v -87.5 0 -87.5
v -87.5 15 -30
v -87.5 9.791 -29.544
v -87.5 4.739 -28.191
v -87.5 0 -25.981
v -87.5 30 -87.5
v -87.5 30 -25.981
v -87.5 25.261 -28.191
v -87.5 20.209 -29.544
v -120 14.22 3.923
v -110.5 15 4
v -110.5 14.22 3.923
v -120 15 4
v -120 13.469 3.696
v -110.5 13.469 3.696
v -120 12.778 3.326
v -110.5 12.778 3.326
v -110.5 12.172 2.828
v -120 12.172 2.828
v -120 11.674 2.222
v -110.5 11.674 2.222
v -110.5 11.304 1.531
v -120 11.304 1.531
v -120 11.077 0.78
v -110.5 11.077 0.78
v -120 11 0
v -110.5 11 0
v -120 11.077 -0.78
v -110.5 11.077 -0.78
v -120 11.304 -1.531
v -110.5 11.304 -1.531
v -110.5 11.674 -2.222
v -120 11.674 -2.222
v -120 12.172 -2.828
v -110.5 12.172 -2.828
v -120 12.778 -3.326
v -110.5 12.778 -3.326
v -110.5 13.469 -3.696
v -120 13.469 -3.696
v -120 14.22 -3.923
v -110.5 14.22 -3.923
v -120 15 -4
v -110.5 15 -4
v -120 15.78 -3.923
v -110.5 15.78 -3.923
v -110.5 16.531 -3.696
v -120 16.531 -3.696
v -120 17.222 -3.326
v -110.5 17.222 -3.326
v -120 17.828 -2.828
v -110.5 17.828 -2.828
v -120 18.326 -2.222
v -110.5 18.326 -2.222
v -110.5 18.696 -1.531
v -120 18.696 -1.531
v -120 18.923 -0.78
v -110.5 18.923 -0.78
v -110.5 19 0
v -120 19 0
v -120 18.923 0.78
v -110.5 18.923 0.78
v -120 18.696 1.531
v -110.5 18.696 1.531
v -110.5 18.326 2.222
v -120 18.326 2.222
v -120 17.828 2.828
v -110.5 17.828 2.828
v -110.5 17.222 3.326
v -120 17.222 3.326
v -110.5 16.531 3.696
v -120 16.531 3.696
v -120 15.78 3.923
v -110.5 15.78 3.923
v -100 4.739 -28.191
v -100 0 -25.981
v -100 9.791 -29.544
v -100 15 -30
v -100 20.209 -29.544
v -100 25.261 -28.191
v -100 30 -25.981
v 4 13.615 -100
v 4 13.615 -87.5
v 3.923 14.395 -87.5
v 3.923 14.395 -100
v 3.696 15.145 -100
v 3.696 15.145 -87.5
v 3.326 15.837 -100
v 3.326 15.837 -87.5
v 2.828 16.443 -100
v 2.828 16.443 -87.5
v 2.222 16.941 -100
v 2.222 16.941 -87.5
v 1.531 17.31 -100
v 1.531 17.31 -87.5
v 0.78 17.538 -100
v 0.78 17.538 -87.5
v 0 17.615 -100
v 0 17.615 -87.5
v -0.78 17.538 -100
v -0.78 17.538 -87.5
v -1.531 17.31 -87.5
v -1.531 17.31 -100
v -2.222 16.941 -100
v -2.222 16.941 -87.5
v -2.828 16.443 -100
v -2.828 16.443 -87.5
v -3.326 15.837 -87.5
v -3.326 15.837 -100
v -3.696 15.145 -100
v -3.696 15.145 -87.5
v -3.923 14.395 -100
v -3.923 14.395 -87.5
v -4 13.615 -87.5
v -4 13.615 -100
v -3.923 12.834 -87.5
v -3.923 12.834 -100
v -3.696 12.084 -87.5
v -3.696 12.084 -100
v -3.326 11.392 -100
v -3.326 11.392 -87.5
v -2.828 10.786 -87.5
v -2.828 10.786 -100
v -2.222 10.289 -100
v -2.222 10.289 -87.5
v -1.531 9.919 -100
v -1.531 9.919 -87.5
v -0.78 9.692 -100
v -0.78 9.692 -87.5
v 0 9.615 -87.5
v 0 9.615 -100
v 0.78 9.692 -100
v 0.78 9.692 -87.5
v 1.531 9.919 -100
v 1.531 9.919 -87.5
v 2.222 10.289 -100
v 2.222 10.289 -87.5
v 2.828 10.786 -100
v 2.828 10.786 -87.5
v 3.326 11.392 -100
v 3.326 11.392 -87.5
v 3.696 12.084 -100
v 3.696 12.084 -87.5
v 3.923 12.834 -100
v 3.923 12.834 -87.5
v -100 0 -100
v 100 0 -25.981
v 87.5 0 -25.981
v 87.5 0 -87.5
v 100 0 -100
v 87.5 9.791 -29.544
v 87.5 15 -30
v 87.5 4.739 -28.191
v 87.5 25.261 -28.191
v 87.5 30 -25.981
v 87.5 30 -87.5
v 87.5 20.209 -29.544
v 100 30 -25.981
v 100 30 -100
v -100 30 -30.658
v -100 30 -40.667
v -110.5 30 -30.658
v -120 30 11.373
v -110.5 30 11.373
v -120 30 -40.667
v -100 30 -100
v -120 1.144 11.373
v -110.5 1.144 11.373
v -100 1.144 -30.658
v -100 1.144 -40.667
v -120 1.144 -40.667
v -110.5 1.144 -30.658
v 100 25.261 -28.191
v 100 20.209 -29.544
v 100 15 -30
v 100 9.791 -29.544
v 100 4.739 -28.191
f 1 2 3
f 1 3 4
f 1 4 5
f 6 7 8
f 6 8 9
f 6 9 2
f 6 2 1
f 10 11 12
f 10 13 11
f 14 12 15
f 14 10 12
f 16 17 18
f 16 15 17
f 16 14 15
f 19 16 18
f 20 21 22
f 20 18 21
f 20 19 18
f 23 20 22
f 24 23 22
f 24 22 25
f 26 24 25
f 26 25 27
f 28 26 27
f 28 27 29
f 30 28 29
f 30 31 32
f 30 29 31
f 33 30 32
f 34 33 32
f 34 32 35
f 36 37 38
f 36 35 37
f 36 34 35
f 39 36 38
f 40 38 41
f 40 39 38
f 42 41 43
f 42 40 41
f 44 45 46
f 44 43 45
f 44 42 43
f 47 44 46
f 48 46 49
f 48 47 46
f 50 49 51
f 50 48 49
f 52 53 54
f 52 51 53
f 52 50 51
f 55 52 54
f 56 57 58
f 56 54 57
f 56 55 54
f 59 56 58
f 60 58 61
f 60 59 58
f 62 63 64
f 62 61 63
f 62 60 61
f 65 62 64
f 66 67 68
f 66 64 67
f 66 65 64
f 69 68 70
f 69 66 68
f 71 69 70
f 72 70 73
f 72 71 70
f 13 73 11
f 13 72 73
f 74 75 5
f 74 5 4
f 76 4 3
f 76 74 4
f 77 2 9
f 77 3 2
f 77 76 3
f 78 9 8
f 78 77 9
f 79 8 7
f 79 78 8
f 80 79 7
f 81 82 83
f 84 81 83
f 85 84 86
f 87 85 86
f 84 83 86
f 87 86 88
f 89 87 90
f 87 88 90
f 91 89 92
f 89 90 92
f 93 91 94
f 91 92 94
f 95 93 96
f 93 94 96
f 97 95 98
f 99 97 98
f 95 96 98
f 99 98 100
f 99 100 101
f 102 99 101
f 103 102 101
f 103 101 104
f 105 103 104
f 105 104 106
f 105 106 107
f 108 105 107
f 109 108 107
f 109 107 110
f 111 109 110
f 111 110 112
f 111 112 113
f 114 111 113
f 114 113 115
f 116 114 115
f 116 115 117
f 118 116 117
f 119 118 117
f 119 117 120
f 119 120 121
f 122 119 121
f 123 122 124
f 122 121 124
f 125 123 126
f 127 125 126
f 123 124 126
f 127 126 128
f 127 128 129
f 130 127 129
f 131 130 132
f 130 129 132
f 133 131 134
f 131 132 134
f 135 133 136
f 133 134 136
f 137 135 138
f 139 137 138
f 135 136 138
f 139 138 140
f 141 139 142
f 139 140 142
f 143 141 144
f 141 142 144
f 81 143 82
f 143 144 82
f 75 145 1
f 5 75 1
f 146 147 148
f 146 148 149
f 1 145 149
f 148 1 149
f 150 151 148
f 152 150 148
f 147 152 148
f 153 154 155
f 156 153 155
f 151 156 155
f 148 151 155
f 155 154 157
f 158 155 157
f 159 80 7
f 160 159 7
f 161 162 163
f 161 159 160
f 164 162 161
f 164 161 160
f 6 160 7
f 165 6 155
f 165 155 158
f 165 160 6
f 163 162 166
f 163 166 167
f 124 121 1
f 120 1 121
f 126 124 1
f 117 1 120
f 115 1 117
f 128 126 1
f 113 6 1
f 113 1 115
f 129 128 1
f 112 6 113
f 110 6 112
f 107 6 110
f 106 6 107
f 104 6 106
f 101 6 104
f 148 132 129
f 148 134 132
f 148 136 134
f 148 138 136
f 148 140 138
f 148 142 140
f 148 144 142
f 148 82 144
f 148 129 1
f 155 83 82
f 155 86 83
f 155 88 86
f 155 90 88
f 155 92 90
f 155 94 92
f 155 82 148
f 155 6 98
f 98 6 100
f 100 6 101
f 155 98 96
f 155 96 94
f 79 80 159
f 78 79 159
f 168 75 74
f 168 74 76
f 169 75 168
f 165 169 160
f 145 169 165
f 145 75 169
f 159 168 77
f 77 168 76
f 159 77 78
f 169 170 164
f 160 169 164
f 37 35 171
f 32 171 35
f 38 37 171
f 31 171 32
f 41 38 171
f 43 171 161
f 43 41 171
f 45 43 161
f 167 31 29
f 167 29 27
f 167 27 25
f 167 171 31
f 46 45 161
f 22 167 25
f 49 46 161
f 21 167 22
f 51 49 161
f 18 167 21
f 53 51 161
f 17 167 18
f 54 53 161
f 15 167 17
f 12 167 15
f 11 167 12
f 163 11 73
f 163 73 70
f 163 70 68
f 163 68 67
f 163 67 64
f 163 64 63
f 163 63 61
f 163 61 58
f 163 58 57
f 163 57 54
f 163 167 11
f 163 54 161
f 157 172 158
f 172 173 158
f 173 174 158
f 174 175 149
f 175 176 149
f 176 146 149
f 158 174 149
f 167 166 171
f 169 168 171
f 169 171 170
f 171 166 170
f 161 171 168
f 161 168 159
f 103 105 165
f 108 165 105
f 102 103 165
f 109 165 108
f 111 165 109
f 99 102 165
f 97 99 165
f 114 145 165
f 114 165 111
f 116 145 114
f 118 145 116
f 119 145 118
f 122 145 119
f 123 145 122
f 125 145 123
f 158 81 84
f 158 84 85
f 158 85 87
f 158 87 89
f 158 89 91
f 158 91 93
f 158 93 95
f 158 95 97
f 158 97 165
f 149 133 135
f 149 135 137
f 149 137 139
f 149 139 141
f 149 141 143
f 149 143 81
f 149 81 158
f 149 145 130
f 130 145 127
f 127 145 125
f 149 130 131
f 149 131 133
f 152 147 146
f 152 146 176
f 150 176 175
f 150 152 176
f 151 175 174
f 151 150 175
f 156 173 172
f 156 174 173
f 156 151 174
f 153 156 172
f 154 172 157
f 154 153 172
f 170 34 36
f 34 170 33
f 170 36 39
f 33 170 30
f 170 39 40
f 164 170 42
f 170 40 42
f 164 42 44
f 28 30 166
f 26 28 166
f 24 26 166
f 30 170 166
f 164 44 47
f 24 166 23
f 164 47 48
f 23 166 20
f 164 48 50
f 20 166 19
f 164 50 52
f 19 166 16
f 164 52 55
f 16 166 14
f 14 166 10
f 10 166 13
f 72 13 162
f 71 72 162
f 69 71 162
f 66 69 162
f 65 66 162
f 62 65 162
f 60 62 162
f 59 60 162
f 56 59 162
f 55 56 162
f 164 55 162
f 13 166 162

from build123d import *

# Parameters (mm, degrees)
SKETCH1_W                = 200
SKETCH1_H                = 200
BOSS_EXTRUDE1_DEPTH      = 30
SKETCH4_W                = 175
SKETCH4_H                = 175
CUT_EXTRUDE1_DEPTH       = 30
SKETCH7_R                = 4
CUT_EXTRUDE2_DEPTH       = 210
SKETCH10_W               = 6.040230253
SKETCH10_H               = 30
BOSS_EXTRUDE2_DEPTH      = 20
SKETCH11_W               = 10
SKETCH11_H               = 30
BOSS_EXTRUDE3_DEPTH      = 20
CUT_EXTRUDE3_START       = -231
SKETCH12_R               = 4
CUT_EXTRUDE3_DEPTH       = 231
SKETCH13_R               = 4
CUT_EXTRUDE5_DEPTH       = 231
SKETCH14_R               = 4
CUT_EXTRUDE6_DEPTH       = 250.5
SKETCH15_R               = 30
SKETCH15_R_2             = 22
BOSS_EXTRUDE5_DEPTH      = 201
SKETCH17_R               = 22
CUT_EXTRUDE7_DEPTH       = 201
SKETCH21_W               = 9.5
SKETCH21_H               = 28.855904386
BOSS_EXTRUDE6_DEPTH      = 26
SKETCH22_W               = 9.5
SKETCH22_H               = 6.040230253
CUT_EXTRUDE10_DEPTH      = 49
SKETCH23_W               = 10.008922512
SKETCH23_H               = 28.855904386
BOSS_EXTRUDE7_DEPTH      = 21
SKETCH24_W               = 9.5
SKETCH24_H               = 1.144095614
CUT_EXTRUDE11_DEPTH      = 27
SKETCH26_W               = 0.50137975
SKETCH26_H               = 20.893624798
CUT_EXTRUDE12_DEPTH      = 35
SKETCH27_R               = 49.192783102
CUT_EXTRUDE13_DEPTH      = 175
SKETCH28_R               = 41.209023923
CUT_EXTRUDE14_DEPTH      = 175
CUT_EXTRUDE15_DEPTH      = 246.814971066
CUT_EXTRUDE15_DEPTH_BACK = 210


with BuildPart() as part:
    # Sketch1 → Boss-Extrude1 (new body)
    with BuildSketch(Plane(origin=(0, 0, 0), x_dir=(1, 0, 0), z_dir=(0, 1, 0))):
        Rectangle(SKETCH1_W, SKETCH1_H)
    extrude(amount=BOSS_EXTRUDE1_DEPTH)

    # Sketch4 → Cut-Extrude1 (cut)
    with BuildSketch(Plane(origin=(0, 30, 0), x_dir=(1, 0, 0), z_dir=(0, 1, 0))):
        Rectangle(SKETCH4_W, SKETCH4_H)
    extrude(amount=-CUT_EXTRUDE1_DEPTH, mode=Mode.SUBTRACT)

    # Sketch7 → Cut-Extrude2 (cut)
    with BuildSketch(Plane.ZY.offset(100)):
        with Locations((0, 15)):
            Circle(SKETCH7_R)
    extrude(amount=-CUT_EXTRUDE2_DEPTH, mode=Mode.SUBTRACT)

    # Sketch10 → Boss-Extrude2 (add)
    with BuildSketch(Plane.ZY.offset(100)):
        with Locations((-11.64671233, 15)):
            Rectangle(SKETCH10_W, SKETCH10_H)
    extrude(amount=BOSS_EXTRUDE2_DEPTH)

    # Sketch11 → Boss-Extrude3 (add)
    with BuildSketch(Plane.XY.offset(-8.626597203)):
        with Locations((-115, 15)):
            Rectangle(SKETCH11_W, SKETCH11_H)
    extrude(amount=BOSS_EXTRUDE3_DEPTH)

    # Sketch12 → Cut-Extrude3 (cut)
    with BuildSketch(Plane(origin=(100, 0, 0), x_dir=(0, 0, -1), z_dir=(1, 0, 0)).offset(CUT_EXTRUDE3_START)):
        with Locations(Location((0, 15, 0), (0, 0, 180))):
            Circle(SKETCH12_R)
    extrude(amount=CUT_EXTRUDE3_DEPTH, mode=Mode.SUBTRACT)

    # Sketch13 → Cut-Extrude5 (cut)
    with BuildSketch(Plane(origin=(0, 30, 0), x_dir=(1, 0, 0), z_dir=(0, 1, 0))):
        with Locations(Location((-93.69452155, -93.045501349, 0), (0, 0, 270))):
            Circle(SKETCH13_R)
    extrude(amount=-CUT_EXTRUDE5_DEPTH, mode=Mode.SUBTRACT)

    # Sketch14 → Cut-Extrude6 (cut)
    with BuildSketch(Plane.XY.offset(100)):
        with Locations((0, 13.614739596)):
            Circle(SKETCH14_R)
    extrude(amount=-CUT_EXTRUDE6_DEPTH, mode=Mode.SUBTRACT)

    # Sketch15 → Boss-Extrude5 (add)
    with BuildSketch(Plane(origin=(100, 0, 0), x_dir=(0, 0, -1), z_dir=(1, 0, 0))):
        with Locations((0, 15)):
            Circle(SKETCH15_R)
        with Locations((0, 15)):
            Circle(SKETCH15_R_2, mode=Mode.SUBTRACT)
    extrude(amount=-BOSS_EXTRUDE5_DEPTH)

    # Sketch17 → Cut-Extrude7 (cut)
    with BuildSketch(Plane(origin=(100, 0, 0), x_dir=(0, 0, -1), z_dir=(1, 0, 0))):
        with Locations((0.074377339, 15.100772812)):
            Circle(SKETCH17_R)
    extrude(amount=-CUT_EXTRUDE7_DEPTH, mode=Mode.SUBTRACT)


with BuildPart() as cut_extrude7_piece_1:
    # of the separate pieces the step leaves, piece 1, a body of its own (cut_extrude7_pieces)
    add(part.part.solids().sort_by_distance((-100, 0, -100))[0])



with BuildPart() as cut_extrude7_piece_2:
    # of the separate pieces the step leaves, piece 2, a body of its own (cut_extrude7_pieces)
    add(part.part.solids().sort_by_distance((-101, 0, -14.666827456))[0])

    # Sketch21 → Boss-Extrude6 (add)
    with BuildSketch(Plane(origin=(0, 0, -14.666827456), x_dir=(-1, 0, 0), z_dir=(0, 0, -1))):
        with Locations((115.25, 15.572047807)):
            Rectangle(SKETCH21_W, SKETCH21_H)
    extrude(amount=BOSS_EXTRUDE6_DEPTH)

    # Sketch22 → Cut-Extrude10 (cut)
    with BuildSketch(Plane(origin=(0, 30, 0), x_dir=(1, 0, 0), z_dir=(0, 1, 0))):
        with Locations((-105.75, 11.64671233)):
            Rectangle(SKETCH22_W, SKETCH22_H)
    extrude(amount=-CUT_EXTRUDE10_DEPTH, mode=Mode.SUBTRACT)


with BuildPart() as cut_extrude7_piece_1_1:
    add(cut_extrude7_piece_1.part)

    add(cut_extrude7_piece_2.part)  # Boss-Extrude7 merges Cut-Extrude7 piece 2
    # Sketch23 → Boss-Extrude7 (add)
    with BuildSketch(Plane(origin=(-110.5, 0, 0), x_dir=(0, 0, -1), z_dir=(1, 0, 0))):
        with Locations((35.6623662, 15.572047807)):
            Rectangle(SKETCH23_W, SKETCH23_H)
    extrude(amount=BOSS_EXTRUDE7_DEPTH)

    # Sketch24 → Cut-Extrude11 (cut)
    with BuildSketch(Plane(origin=(0, 0, -14.666827456), x_dir=(-1, 0, 0), z_dir=(0, 0, -1))):
        with Locations((115.25, 0.572047807)):
            Rectangle(SKETCH24_W, SKETCH24_H)
    extrude(amount=-CUT_EXTRUDE11_DEPTH, mode=Mode.SUBTRACT)

    # Sketch26 → Cut-Extrude12 (cut)
    with BuildSketch(Plane.XZ):
        with Locations((-110.249310125, 1.820215196)):
            Rectangle(SKETCH26_W, SKETCH26_H)
    extrude(amount=-CUT_EXTRUDE12_DEPTH, mode=Mode.SUBTRACT)

    # Sketch27 → Cut-Extrude13 (cut)
    with BuildSketch(Plane(origin=(-87.5, 0, 0), x_dir=(0, 0, -1), z_dir=(1, 0, 0))):
        with Locations((-31.916352411, 15.376133278)):
            Circle(SKETCH27_R)
    extrude(amount=CUT_EXTRUDE13_DEPTH, mode=Mode.SUBTRACT)

    # Sketch28 → Cut-Extrude14 (cut)
    with BuildSketch(Plane(origin=(-87.5, 0, 0), x_dir=(0, 0, -1), z_dir=(1, 0, 0))):
        with Locations((37.762434774, 15.494435184)):
            Circle(SKETCH28_R)
    extrude(amount=CUT_EXTRUDE14_DEPTH, mode=Mode.SUBTRACT)

    # Sketch30 → Cut-Extrude15 (cut, two sides: drawn at the far end of the back side and taken through both)
    with BuildSketch(Plane(origin=(100, 0, 0), x_dir=(0, 0, -1), z_dir=(1, 0, 0)).offset(-CUT_EXTRUDE15_DEPTH_BACK)):
        with BuildLine():
            Line((-112.795739645, -240.367951942), (25.980762114, 0))
            ThreePointArc((25.980762114, 0), (30, 15), (25.980762114, 30))
            Line((25.980762114, 30), (-112.795739645, 270.367951942))
            Line((-112.795739645, 270.367951942), (-667.901746678, 270.367951942))
            Line((-667.901746678, 270.367951942), (-667.901746678, -240.367951942))
            Line((-667.901746678, -240.367951942), (-112.795739645, -240.367951942))
        make_face()
    extrude(amount=CUT_EXTRUDE15_DEPTH + CUT_EXTRUDE15_DEPTH_BACK, mode=Mode.SUBTRACT)


solid = cut_extrude7_piece_1_1.part
